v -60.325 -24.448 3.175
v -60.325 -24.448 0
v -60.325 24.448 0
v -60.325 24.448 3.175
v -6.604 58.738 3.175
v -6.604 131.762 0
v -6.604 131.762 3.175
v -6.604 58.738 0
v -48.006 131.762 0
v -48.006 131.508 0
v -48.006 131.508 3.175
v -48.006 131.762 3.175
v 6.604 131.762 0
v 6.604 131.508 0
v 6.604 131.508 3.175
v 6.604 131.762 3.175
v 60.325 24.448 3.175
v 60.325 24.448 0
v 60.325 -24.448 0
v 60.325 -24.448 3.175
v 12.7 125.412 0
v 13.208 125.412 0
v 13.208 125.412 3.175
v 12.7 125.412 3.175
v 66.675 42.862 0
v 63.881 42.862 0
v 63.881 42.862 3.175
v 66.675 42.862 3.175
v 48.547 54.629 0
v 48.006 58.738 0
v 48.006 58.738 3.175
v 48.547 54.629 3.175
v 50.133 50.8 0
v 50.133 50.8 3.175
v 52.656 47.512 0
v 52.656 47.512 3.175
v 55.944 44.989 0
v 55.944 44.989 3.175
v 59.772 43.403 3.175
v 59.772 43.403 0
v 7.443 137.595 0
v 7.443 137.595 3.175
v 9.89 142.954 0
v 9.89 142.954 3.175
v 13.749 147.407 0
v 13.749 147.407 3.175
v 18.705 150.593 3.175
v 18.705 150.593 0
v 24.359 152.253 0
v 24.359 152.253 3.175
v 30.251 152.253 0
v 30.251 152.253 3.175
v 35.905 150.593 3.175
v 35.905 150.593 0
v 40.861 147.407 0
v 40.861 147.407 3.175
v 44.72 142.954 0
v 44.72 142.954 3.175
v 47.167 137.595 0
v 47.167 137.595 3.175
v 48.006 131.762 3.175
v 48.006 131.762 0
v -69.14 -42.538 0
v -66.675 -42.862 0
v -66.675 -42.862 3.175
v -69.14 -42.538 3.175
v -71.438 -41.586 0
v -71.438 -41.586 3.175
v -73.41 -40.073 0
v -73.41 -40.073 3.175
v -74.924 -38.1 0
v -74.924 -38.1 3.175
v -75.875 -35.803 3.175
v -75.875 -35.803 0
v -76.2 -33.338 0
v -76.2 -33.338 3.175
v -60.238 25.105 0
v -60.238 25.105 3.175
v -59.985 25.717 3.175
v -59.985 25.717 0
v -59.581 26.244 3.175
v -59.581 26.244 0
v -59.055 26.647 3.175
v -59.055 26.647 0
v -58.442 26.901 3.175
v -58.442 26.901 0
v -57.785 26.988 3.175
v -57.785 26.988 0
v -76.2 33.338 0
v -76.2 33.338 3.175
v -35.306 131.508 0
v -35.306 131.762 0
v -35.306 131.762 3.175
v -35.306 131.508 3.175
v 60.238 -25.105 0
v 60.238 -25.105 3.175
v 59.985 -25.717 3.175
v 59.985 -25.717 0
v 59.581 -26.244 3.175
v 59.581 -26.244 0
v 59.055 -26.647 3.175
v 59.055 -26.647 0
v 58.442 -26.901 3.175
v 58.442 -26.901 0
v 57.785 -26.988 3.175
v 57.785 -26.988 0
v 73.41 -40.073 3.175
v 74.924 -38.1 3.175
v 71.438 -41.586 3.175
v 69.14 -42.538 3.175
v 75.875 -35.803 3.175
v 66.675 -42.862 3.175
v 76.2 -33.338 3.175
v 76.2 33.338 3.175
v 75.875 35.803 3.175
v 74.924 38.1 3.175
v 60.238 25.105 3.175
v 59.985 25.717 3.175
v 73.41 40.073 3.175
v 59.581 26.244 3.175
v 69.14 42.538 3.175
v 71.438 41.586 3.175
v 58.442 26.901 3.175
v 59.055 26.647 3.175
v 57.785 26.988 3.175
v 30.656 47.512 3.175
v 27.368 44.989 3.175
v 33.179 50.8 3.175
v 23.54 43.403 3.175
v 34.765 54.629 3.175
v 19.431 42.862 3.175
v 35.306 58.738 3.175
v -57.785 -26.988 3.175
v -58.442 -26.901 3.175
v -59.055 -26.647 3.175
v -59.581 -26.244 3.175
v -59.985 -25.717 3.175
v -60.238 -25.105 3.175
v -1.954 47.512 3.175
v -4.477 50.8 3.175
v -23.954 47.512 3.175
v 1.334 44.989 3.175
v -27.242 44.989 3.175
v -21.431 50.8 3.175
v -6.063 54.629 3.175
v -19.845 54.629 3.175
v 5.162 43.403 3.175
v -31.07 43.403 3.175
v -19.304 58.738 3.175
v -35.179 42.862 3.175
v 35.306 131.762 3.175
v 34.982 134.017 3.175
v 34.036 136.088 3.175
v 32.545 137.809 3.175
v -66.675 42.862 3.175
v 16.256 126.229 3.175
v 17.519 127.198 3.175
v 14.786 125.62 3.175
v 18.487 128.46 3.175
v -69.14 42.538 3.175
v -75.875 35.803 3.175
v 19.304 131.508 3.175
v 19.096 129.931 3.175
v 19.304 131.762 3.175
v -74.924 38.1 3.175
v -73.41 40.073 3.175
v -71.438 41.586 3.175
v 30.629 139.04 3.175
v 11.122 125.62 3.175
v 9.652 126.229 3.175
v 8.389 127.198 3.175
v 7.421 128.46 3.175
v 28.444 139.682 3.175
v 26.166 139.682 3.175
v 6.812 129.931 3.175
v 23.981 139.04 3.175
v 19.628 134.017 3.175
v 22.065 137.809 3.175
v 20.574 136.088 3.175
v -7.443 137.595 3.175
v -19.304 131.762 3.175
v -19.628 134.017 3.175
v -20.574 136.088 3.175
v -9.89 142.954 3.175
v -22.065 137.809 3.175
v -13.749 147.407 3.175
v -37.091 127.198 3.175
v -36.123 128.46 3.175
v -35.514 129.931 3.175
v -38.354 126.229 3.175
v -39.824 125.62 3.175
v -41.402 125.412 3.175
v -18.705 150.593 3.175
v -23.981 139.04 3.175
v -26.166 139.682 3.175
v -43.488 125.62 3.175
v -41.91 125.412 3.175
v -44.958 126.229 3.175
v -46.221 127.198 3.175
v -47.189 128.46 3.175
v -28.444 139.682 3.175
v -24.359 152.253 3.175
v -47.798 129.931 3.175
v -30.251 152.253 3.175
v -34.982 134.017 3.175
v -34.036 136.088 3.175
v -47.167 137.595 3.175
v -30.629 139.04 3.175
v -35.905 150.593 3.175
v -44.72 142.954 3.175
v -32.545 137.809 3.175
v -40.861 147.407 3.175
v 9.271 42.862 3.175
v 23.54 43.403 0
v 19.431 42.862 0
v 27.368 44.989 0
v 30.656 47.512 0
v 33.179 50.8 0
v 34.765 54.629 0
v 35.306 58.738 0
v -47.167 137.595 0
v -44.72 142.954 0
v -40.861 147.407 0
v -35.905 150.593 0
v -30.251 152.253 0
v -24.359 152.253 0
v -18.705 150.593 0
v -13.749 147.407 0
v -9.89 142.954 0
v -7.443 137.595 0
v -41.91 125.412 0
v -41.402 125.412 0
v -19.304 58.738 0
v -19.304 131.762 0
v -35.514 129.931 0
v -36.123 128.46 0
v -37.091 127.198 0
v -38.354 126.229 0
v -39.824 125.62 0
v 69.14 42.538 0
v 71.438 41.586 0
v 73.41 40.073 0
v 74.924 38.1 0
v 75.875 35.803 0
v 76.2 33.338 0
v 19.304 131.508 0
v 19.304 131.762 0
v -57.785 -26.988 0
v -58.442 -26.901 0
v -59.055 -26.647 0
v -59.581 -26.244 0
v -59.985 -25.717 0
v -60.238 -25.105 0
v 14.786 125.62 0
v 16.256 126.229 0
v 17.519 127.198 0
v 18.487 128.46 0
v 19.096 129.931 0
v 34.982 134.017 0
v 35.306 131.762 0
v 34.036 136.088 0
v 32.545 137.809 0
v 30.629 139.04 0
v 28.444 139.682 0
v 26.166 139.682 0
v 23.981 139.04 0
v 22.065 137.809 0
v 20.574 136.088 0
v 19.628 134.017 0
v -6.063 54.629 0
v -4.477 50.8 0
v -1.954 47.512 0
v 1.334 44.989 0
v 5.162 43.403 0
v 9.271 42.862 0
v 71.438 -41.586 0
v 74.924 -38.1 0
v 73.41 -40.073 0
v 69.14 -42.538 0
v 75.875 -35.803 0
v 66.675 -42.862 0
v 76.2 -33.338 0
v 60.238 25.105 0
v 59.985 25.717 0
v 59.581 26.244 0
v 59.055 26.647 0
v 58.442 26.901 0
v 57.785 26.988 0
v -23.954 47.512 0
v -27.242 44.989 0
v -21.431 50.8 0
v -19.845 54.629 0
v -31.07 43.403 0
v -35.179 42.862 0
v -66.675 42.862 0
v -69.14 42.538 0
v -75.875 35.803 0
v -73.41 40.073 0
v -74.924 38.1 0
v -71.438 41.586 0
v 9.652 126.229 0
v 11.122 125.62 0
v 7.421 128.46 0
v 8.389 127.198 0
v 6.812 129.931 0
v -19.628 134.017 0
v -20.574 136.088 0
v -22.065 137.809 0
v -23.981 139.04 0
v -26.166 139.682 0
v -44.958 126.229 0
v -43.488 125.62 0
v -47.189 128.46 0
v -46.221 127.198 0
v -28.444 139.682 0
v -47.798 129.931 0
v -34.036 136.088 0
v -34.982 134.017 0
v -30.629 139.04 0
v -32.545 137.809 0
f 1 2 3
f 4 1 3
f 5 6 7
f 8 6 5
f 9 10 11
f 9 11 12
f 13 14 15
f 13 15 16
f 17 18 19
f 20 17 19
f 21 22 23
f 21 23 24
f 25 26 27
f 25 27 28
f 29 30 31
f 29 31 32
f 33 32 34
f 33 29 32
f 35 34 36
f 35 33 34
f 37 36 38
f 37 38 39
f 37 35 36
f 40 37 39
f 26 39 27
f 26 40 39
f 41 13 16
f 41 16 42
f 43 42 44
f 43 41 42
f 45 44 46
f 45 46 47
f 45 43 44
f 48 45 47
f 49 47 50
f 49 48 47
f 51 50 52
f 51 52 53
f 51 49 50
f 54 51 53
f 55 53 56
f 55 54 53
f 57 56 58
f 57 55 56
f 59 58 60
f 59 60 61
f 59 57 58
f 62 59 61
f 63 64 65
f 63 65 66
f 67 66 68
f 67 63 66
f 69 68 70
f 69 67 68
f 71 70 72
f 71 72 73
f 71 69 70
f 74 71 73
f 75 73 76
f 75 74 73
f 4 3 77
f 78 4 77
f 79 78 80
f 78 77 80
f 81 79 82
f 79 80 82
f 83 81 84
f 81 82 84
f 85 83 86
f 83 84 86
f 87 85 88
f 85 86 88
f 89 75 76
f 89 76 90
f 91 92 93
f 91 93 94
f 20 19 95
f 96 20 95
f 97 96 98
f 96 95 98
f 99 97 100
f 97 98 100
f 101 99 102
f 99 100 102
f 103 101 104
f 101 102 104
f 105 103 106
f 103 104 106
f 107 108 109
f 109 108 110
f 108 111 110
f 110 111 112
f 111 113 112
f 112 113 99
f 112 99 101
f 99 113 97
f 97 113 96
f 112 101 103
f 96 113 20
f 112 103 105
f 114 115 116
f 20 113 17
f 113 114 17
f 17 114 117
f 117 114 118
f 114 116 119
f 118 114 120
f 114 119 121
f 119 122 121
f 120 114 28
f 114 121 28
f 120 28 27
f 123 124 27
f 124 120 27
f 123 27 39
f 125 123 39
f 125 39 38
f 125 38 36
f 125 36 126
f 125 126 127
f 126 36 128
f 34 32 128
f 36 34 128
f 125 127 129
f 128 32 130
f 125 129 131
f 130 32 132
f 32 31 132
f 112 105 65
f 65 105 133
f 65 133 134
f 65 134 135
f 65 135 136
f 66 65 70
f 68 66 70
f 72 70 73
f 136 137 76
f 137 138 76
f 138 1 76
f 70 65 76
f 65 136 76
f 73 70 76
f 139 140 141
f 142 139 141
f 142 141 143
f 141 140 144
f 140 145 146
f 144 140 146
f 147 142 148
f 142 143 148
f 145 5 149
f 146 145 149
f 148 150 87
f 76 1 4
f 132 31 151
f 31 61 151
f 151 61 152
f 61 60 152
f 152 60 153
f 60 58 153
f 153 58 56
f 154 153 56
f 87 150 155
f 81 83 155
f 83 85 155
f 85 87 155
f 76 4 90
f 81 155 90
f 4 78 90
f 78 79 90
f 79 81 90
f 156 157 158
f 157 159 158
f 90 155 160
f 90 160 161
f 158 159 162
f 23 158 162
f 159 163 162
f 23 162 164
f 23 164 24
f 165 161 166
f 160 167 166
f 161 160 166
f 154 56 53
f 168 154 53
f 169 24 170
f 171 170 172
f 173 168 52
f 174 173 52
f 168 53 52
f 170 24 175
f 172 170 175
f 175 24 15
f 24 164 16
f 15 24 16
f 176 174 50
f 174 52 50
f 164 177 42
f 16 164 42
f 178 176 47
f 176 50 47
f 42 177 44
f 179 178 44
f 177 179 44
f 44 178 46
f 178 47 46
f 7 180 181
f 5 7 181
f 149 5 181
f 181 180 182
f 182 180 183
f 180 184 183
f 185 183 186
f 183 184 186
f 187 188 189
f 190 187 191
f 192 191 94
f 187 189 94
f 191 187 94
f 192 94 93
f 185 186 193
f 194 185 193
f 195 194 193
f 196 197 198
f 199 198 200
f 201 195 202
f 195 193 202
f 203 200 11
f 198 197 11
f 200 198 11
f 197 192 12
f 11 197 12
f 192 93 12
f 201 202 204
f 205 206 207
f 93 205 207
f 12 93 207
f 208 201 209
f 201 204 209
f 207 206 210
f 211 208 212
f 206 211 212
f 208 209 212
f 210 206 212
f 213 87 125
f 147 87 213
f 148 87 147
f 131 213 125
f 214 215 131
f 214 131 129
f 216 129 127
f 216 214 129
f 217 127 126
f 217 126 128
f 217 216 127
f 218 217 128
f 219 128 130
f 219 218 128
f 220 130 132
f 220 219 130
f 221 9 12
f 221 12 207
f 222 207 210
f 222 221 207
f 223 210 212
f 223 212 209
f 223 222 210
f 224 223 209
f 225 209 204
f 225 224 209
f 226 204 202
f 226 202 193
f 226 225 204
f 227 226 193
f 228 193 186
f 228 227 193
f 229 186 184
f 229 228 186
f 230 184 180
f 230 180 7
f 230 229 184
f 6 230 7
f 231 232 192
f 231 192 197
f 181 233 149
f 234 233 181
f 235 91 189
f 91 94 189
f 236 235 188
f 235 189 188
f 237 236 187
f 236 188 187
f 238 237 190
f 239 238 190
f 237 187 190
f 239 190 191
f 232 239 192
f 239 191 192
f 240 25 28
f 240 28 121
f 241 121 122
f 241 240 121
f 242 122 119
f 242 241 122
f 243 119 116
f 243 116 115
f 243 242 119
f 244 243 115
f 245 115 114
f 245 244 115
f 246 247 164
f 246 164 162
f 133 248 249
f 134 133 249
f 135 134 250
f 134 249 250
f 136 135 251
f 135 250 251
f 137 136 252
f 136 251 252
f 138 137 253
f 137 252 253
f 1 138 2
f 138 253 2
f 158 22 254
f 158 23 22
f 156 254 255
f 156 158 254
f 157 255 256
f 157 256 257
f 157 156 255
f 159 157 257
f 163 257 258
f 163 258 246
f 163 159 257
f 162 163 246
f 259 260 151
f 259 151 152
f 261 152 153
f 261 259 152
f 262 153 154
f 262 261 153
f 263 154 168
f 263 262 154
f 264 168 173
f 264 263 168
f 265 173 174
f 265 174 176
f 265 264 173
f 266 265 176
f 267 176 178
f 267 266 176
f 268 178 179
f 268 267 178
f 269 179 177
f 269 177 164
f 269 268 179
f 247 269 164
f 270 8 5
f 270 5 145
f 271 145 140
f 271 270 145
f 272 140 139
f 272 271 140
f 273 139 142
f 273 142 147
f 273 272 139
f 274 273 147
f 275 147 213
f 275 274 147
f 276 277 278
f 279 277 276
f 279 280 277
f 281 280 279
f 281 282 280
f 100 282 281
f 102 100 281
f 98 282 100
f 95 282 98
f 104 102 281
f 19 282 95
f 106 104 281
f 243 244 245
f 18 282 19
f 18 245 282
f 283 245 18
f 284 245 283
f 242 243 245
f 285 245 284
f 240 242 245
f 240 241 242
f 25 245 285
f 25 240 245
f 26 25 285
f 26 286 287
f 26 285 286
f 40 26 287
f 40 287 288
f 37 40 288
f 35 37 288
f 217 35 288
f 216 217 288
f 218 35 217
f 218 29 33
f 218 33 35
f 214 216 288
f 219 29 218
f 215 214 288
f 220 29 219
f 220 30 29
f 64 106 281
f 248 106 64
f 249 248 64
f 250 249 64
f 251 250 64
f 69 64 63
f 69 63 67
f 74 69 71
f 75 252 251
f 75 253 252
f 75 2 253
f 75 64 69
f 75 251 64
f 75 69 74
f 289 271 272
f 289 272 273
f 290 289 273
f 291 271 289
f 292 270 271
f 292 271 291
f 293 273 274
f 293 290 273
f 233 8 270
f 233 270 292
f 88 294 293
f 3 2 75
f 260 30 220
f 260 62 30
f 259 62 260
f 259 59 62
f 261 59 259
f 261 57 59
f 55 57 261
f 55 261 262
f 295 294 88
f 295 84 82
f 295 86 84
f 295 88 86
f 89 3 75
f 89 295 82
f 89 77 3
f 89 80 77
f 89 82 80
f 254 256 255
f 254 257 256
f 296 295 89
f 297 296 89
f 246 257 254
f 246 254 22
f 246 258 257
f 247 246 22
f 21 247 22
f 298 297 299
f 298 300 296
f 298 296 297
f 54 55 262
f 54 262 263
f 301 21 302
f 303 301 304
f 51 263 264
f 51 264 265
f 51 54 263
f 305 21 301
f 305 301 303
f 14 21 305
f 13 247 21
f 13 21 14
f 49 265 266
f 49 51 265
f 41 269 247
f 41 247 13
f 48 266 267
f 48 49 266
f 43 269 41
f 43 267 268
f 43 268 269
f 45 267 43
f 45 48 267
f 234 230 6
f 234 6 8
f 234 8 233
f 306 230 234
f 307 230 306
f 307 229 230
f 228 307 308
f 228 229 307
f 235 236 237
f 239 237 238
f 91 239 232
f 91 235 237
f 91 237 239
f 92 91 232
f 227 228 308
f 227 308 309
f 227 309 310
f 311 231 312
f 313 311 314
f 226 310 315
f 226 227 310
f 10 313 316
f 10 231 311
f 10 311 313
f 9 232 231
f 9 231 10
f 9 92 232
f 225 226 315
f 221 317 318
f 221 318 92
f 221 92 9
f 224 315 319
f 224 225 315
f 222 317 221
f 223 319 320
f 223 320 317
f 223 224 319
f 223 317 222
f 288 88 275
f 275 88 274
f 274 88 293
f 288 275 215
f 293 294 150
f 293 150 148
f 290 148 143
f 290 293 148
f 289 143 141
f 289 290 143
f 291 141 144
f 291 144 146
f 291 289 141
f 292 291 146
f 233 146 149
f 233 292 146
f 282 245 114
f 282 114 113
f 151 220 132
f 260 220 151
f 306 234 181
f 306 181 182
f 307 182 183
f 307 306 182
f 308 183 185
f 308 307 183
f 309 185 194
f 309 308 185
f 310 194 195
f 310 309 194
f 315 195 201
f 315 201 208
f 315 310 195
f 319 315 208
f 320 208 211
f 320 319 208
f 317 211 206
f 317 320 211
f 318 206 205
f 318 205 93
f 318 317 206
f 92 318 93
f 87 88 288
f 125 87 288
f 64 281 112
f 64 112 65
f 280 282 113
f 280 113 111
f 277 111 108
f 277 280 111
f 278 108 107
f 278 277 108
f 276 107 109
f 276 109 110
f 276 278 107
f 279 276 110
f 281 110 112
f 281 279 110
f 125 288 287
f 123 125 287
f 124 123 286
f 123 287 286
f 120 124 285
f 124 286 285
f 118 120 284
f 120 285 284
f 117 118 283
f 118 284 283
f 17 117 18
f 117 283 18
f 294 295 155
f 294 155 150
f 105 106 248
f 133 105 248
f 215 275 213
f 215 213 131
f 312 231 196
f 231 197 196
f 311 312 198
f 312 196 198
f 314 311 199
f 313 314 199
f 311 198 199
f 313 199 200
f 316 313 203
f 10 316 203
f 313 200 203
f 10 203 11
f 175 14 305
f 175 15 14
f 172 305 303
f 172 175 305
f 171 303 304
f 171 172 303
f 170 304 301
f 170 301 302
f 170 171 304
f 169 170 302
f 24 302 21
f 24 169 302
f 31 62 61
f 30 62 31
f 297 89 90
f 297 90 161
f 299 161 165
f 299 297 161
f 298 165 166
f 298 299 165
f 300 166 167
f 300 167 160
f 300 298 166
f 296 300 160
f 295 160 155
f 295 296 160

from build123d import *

# Parameters (mm, degrees)
BOSS_EXTRUDE1_DEPTH = 3.175
FILLET1_R           = 6.096


with BuildPart() as part:
    # Sketch1 → Boss-Extrude1 (new body)
    with BuildSketch(Plane.XY):
        with BuildLine():
            Line((-66.675, 42.8625), (-35.179, 42.8625))
            ThreePointArc((-35.179, 42.8625), (-23.953679849, 47.512179849), (-19.304, 58.7375))
            Line((-19.304, 58.7375), (-19.304, 131.7625))
            ThreePointArc((-19.304, 131.7625), (-27.305, 139.7635), (-35.306, 131.7625))
            Line((-35.306, 131.7625), (-35.306, 125.4125))
            Line((-35.306, 125.4125), (-48.006, 125.4125))
            Line((-48.006, 125.4125), (-48.006, 131.7625))
            ThreePointArc((-48.006, 131.7625), (-27.305, 152.4635), (-6.604, 131.7625))
            Line((-6.604, 131.7625), (-6.604, 58.7375))
            ThreePointArc((-6.604, 58.7375), (-1.954320151, 47.512179849), (9.271, 42.8625))
            Line((9.271, 42.8625), (19.431, 42.8625))
            ThreePointArc((19.431, 42.8625), (30.656320151, 47.512179849), (35.306, 58.7375))
            Line((35.306, 58.7375), (35.306, 131.7625))
            ThreePointArc((35.306, 131.7625), (27.305, 139.7635), (19.304, 131.7625))
            Line((19.304, 131.7625), (19.304, 125.4125))
            Line((19.304, 125.4125), (6.604, 125.4125))
            Line((6.604, 125.4125), (6.604, 131.7625))
            ThreePointArc((6.604, 131.7625), (27.305, 152.4635), (48.006, 131.7625))
            Line((48.006, 131.7625), (48.006, 58.7375))
            ThreePointArc((48.006, 58.7375), (52.655679849, 47.512179849), (63.881, 42.8625))
            Line((63.881, 42.8625), (66.675, 42.8625))
            ThreePointArc((66.675, 42.8625), (73.410192091, 40.072692091), (76.2, 33.3375))
            Line((76.2, 33.3375), (76.2, -33.3375))
            ThreePointArc((76.2, -33.3375), (73.410192091, -40.072692091), (66.675, -42.8625))
            Line((66.675, -42.8625), (-66.675, -42.8625))
            ThreePointArc((-66.675, -42.8625), (-73.410192091, -40.072692091), (-76.2, -33.3375))
            Line((-76.2, -33.3375), (-76.2, 33.3375))
            ThreePointArc((-76.2, 33.3375), (-73.410192091, 40.072692091), (-66.675, 42.8625))
        make_face()
        with BuildLine():
            Line((-57.785, 26.9875), (57.785, 26.9875))
            ThreePointArc((57.785, 26.9875), (59.581051224, 26.243551224), (60.325, 24.4475))
            Line((60.325, 24.4475), (60.325, -24.4475))
            ThreePointArc((60.325, -24.4475), (59.581051224, -26.243551224), (57.785, -26.9875))
            Line((57.785, -26.9875), (-57.785, -26.9875))
            ThreePointArc((-57.785, -26.9875), (-59.581051224, -26.243551224), (-60.325, -24.4475))
            Line((-60.325, -24.4475), (-60.325, 24.4475))
            ThreePointArc((-60.325, 24.4475), (-59.581051224, 26.243551224), (-57.785, 26.9875))
        make_face(mode=Mode.SUBTRACT)
    extrude(amount=BOSS_EXTRUDE1_DEPTH)

    # Fillet1
    fillet1_edges = [part.edges().sort_by_distance(p)[0] for p in [
        (-35.306, 125.4125, 1.5875),
        (-48.006, 125.4125, 1.5875),
        (19.304, 125.4125, 1.5875),
        (6.604, 125.4125, 1.5875),
    ]]
    fillet(fillet1_edges, radius=FILLET1_R)


solid = part.part
